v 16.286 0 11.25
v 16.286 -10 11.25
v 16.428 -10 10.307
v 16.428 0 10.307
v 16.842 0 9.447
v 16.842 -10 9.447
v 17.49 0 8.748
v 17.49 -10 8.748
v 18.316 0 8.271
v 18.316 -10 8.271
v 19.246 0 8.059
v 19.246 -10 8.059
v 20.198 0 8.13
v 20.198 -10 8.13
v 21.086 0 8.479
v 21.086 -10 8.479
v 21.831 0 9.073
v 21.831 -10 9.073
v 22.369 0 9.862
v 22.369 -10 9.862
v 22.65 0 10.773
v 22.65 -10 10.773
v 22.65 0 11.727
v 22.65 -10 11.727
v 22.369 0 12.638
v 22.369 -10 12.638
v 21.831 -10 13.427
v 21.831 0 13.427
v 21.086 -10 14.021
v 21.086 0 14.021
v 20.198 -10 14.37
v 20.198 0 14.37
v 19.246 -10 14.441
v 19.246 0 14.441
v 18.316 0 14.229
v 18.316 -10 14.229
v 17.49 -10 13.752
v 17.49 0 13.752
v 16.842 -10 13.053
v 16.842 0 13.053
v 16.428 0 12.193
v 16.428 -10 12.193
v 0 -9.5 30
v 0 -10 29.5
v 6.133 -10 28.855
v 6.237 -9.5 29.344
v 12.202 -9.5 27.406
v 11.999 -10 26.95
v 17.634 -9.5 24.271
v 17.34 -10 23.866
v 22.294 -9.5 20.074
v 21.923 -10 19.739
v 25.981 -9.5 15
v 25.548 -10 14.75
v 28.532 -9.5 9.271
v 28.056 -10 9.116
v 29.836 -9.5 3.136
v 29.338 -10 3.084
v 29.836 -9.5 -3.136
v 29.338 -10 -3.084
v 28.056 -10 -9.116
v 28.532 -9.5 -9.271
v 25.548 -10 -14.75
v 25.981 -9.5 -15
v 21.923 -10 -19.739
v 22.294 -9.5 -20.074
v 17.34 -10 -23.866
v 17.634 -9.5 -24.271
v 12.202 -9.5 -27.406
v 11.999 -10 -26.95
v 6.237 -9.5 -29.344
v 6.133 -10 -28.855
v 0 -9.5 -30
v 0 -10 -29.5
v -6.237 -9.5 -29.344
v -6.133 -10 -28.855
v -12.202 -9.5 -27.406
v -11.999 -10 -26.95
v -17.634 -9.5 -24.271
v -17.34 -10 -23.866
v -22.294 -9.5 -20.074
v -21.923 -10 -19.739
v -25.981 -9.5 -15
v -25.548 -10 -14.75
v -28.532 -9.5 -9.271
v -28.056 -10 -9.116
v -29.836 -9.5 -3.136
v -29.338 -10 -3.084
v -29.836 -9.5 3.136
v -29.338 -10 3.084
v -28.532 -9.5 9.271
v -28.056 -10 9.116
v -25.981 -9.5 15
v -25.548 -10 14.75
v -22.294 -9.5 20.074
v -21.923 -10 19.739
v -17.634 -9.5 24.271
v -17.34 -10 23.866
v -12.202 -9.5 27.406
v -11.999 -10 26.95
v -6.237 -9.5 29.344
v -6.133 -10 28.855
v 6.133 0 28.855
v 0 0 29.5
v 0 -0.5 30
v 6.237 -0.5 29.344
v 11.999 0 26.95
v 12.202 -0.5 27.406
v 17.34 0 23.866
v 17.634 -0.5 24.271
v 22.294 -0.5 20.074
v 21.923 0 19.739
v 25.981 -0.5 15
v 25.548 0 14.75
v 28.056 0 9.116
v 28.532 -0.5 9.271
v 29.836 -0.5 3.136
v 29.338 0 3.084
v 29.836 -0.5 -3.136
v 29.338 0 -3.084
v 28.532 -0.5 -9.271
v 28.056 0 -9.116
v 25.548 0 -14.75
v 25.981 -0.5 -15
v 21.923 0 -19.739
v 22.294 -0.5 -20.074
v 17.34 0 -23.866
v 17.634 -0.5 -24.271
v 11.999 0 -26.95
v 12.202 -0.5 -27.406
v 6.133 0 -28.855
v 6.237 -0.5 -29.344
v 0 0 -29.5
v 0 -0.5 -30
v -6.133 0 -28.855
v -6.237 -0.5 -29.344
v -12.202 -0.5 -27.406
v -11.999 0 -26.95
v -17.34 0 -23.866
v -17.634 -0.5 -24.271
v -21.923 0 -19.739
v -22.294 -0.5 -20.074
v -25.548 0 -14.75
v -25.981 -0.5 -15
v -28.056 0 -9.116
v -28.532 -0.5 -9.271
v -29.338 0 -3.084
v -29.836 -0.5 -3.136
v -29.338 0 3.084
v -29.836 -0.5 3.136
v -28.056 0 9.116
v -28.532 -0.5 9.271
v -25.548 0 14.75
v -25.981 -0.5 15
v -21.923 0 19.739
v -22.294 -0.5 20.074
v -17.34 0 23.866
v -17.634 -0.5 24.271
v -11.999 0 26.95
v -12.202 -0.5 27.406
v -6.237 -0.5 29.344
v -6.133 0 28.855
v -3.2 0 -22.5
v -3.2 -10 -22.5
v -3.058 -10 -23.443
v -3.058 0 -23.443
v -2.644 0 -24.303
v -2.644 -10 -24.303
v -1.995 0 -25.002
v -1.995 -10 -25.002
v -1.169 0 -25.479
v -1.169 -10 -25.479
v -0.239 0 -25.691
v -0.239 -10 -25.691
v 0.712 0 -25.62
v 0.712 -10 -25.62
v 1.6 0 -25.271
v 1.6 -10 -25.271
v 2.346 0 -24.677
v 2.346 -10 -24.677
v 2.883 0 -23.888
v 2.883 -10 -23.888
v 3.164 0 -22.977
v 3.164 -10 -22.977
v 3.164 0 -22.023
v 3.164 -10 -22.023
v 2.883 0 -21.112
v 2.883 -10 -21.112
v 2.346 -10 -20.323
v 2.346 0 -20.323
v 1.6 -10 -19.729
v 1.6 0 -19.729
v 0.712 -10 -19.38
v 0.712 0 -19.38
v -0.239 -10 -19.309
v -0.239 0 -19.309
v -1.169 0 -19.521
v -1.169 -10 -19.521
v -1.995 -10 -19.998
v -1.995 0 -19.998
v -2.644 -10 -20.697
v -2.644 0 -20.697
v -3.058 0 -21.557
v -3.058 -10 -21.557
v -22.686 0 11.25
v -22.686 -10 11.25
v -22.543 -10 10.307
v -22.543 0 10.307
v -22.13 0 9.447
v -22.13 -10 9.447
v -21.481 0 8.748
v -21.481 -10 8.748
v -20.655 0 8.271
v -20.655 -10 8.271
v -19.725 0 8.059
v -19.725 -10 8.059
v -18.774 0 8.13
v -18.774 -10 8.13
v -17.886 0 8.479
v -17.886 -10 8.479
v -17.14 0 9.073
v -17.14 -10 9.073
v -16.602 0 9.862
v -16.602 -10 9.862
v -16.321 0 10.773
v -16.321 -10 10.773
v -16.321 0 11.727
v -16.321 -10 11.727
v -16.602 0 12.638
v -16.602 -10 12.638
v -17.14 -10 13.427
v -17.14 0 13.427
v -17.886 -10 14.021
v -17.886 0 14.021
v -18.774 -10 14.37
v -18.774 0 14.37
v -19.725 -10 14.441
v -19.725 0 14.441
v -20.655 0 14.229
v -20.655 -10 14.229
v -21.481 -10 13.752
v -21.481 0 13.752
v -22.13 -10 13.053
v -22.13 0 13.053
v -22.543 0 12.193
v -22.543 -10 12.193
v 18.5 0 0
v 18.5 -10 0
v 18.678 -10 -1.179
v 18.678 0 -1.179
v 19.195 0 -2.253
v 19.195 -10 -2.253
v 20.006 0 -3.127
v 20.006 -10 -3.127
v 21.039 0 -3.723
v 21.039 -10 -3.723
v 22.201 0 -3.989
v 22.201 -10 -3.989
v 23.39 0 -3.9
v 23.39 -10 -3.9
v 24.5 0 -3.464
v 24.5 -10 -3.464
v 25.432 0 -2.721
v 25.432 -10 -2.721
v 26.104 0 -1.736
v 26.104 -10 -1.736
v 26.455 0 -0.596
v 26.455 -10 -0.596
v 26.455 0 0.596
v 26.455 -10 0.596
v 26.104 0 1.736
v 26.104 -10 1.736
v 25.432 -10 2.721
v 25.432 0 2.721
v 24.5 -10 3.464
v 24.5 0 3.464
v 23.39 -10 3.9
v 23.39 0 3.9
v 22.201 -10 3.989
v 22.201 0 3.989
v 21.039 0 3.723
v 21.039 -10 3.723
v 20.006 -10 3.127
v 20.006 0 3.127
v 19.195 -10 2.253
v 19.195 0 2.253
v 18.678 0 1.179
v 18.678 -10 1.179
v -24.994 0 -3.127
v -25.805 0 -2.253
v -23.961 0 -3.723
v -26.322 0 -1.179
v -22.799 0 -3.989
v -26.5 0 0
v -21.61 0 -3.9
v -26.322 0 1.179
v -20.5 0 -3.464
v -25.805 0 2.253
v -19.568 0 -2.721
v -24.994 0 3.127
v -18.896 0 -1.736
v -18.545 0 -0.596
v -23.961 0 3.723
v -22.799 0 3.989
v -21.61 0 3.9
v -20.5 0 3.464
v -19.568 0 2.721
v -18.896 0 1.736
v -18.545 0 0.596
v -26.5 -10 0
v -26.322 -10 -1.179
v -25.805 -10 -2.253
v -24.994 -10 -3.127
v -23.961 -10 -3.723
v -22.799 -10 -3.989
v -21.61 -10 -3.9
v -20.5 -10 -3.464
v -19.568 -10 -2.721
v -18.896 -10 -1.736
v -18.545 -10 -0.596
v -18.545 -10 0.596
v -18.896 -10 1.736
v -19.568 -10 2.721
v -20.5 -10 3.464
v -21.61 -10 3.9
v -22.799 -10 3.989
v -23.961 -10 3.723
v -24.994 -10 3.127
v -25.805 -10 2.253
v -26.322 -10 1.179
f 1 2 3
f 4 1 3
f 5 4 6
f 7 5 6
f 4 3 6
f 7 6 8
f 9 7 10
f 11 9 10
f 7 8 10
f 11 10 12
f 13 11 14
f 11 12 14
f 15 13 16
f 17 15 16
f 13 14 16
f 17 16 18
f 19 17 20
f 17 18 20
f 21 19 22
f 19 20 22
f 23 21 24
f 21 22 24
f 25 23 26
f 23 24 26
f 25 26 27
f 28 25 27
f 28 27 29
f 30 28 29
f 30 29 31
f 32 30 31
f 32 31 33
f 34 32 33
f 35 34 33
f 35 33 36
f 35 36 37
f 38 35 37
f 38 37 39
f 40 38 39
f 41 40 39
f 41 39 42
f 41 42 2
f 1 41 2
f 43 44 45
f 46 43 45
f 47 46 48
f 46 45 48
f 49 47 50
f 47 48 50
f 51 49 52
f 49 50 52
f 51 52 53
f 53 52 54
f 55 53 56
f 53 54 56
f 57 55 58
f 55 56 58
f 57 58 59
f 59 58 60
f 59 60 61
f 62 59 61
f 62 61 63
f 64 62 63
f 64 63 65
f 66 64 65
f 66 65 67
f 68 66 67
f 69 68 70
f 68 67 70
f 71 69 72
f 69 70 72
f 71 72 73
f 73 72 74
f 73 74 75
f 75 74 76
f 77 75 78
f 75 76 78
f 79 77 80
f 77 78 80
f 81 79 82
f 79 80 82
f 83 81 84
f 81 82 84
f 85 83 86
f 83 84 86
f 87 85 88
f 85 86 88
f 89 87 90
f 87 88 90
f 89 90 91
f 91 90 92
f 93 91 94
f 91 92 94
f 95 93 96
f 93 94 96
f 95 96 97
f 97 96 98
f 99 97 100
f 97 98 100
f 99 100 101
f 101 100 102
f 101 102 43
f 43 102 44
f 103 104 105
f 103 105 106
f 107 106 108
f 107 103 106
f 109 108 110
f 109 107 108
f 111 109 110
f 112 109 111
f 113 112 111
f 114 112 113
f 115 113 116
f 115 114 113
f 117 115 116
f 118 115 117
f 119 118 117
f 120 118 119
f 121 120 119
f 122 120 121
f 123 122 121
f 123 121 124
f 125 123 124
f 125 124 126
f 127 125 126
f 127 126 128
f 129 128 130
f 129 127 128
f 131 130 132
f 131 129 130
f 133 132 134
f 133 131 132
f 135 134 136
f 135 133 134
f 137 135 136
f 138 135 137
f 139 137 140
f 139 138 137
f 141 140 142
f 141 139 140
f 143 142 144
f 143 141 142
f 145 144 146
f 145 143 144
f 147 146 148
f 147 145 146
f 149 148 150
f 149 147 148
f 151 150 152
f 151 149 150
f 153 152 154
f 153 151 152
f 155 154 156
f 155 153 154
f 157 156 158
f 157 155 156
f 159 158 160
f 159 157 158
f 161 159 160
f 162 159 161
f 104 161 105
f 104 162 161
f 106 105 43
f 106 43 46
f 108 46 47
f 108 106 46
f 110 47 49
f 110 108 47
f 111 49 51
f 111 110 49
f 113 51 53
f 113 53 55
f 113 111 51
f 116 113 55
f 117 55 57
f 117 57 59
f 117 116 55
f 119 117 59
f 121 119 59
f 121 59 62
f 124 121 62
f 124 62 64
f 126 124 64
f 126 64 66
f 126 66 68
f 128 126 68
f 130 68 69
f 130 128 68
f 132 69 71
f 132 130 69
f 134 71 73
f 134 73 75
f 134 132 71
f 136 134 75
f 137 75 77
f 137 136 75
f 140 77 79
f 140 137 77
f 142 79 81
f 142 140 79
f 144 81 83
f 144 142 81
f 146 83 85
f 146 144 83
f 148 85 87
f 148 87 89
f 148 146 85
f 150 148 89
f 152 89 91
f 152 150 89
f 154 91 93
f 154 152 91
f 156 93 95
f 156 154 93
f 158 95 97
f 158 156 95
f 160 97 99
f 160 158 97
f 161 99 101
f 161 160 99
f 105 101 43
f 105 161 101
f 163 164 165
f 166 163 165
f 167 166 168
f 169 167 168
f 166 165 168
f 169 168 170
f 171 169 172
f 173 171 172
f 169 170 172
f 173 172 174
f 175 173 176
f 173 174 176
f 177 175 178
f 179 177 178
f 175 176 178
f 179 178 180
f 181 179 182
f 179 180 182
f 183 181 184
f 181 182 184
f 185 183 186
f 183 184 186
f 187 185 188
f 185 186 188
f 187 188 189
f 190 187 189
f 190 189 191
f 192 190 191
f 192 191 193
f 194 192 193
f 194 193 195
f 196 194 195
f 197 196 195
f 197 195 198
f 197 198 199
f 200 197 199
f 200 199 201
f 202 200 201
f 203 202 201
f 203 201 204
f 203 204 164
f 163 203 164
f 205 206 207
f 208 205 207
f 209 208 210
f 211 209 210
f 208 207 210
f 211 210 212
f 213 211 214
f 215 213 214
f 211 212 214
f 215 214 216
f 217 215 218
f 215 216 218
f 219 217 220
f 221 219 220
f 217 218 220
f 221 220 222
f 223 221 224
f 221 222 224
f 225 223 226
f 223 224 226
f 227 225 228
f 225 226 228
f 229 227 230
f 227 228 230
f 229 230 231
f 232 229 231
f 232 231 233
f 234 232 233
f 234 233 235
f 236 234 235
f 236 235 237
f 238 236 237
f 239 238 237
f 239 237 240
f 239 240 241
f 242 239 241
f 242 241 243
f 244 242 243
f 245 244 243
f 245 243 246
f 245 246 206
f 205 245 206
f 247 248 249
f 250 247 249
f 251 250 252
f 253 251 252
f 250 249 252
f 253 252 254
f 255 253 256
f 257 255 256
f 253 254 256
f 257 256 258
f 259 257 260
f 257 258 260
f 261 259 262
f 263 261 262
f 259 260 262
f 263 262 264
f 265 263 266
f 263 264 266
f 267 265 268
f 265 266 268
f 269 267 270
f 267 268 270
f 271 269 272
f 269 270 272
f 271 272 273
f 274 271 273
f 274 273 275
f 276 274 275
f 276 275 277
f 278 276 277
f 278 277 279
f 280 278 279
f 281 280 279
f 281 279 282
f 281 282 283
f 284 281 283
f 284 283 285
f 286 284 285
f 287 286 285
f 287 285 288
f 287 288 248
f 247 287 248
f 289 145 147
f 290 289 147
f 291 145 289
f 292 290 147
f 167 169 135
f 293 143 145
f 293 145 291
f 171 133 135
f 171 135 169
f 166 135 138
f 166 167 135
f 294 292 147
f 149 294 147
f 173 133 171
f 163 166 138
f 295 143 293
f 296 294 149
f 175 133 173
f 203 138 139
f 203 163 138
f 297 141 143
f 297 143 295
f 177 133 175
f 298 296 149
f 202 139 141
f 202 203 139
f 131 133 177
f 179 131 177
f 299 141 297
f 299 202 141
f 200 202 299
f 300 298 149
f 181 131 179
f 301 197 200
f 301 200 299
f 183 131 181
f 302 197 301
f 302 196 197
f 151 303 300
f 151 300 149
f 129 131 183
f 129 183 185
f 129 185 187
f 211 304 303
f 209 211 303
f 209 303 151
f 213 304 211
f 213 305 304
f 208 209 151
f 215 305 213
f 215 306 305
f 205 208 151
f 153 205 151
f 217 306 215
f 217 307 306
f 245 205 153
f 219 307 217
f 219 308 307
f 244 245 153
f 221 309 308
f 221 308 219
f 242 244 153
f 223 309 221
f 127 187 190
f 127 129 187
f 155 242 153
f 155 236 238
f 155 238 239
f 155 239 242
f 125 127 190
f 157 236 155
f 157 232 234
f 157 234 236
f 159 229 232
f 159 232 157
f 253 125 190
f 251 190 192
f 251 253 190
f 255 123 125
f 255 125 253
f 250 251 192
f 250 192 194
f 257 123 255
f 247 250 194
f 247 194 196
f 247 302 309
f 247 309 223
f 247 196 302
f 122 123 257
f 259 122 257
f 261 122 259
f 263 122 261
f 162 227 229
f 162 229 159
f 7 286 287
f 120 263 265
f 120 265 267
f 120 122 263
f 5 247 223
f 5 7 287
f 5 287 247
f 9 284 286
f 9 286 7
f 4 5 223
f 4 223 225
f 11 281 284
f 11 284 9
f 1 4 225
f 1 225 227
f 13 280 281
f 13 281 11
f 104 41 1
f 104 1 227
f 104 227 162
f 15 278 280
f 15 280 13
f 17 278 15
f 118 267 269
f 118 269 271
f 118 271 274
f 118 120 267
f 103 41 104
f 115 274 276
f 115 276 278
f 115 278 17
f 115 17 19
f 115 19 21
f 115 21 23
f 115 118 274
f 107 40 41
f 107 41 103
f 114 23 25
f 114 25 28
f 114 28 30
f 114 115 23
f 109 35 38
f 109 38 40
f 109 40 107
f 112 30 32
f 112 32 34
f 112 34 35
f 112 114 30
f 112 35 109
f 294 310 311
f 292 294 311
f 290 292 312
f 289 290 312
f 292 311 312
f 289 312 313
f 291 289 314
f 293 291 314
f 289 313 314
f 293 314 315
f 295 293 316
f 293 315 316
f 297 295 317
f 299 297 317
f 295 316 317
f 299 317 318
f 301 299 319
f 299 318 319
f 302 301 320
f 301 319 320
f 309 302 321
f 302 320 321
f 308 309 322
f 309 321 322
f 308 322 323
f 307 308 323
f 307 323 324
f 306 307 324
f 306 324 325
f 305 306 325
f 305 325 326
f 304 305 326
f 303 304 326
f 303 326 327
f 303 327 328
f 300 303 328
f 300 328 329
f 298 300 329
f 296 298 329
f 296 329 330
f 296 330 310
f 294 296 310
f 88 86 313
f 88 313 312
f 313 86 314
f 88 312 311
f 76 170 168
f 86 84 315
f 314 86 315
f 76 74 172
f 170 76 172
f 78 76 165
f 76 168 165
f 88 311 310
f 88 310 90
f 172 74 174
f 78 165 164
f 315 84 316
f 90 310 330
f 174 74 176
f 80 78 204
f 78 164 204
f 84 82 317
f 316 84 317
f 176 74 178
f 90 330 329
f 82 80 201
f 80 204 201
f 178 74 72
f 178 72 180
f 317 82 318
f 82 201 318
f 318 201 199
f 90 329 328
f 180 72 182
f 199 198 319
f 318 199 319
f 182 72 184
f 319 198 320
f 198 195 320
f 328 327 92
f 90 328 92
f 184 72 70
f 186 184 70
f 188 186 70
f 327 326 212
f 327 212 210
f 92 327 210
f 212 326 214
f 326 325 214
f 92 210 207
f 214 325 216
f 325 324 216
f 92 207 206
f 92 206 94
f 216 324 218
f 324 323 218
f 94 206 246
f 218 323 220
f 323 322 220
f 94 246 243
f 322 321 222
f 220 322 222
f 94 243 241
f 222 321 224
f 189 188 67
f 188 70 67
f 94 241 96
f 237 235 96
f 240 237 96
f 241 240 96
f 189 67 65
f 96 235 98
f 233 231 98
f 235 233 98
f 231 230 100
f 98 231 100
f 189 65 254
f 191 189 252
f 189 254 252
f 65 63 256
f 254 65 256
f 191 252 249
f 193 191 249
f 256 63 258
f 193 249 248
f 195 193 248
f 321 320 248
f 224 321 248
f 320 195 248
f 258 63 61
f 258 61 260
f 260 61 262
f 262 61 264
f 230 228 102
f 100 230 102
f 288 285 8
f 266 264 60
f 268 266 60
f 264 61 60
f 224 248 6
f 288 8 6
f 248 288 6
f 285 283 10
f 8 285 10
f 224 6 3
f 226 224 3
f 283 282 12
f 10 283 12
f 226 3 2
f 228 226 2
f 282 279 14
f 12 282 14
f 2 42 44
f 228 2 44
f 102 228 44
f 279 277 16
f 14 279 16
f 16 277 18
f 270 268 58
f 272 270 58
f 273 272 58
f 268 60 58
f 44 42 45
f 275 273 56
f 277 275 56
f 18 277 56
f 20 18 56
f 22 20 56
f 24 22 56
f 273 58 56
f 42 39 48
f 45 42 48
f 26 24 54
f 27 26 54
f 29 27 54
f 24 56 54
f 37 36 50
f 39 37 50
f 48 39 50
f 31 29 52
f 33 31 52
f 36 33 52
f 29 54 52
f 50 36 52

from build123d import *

# Parameters (mm, degrees)
SKETCH1_R             = 30
BOSS_EXTRUDE1_DEPTH   = 10
F_8_0MM_DOWEL_HOLE1_D = 8
M6_CLEARANCE_HOLE1_D  = 6.4
CHAMFER1_SIZE         = 0.5


with BuildPart() as part:
    # Sketch1 → Boss-Extrude1 (new body)
    with BuildSketch(Plane(origin=(0, 0, 0), x_dir=(1, 0, 0), z_dir=(0, 1, 0))):
        with Locations(Location((0, 0, 0), (0, 0, 270))):
            Circle(SKETCH1_R)
    extrude(amount=-BOSS_EXTRUDE1_DEPTH)

    # Ø8.0mm Dowel Hole1 (through all)
    with Locations(Plane(origin=(0, 0, 0), x_dir=(1, 0, 0), z_dir=(0, 1, 0))):
        with Locations((-22.5, 0), (22.5, 0)):
            Hole(F_8_0MM_DOWEL_HOLE1_D / 2)

    # M6 Clearance Hole1 (through all)
    with Locations(Plane(origin=(0, 0, 0), x_dir=(1, 0, 0), z_dir=(0, 1, 0))):
        with Locations((19.485571585, -11.25), (-19.485571585, -11.25), (0, 22.5)):
            Hole(M6_CLEARANCE_HOLE1_D / 2)

    # Chamfer1
    chamfer1_edges = [part.edges().sort_by_distance(p)[0] for p in [
        (0, 0, -30),
        (0, -10, -30),
    ]]
    chamfer(chamfer1_edges, length=CHAMFER1_SIZE)


solid = part.part
